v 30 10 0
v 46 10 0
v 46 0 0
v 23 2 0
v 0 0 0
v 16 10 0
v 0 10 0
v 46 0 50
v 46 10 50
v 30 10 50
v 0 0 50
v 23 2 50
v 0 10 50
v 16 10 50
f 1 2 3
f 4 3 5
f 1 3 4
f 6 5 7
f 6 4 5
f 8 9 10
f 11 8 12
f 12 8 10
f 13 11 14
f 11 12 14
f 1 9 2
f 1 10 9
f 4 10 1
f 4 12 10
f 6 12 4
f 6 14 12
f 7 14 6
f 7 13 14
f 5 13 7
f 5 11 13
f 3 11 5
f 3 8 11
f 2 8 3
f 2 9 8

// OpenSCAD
$fn = 32;

// ----------------------------------------------------------------------
// V guide rail: vway, 46 mm wide
// ----------------------------------------------------------------------

// --- parameters (mm) ---
rail_w = 46;              // rail width, X
base_t = 10;              // base plate thickness
v_depth = 8;              // V feature depth / height
v_half_w = 7;             // half width of the V at the base face
plate_t = 50;             // rail length, Z (the extrusion height)

profile = [[0, 0], [46, 0], [46, 10], [30, 10], [23, 2], [16, 10], [0, 10]];  // primary outline, 7 points, counter clockwise

// --- the one profile operation ---
linear_extrude(height = plate_t) polygon(points = profile);
